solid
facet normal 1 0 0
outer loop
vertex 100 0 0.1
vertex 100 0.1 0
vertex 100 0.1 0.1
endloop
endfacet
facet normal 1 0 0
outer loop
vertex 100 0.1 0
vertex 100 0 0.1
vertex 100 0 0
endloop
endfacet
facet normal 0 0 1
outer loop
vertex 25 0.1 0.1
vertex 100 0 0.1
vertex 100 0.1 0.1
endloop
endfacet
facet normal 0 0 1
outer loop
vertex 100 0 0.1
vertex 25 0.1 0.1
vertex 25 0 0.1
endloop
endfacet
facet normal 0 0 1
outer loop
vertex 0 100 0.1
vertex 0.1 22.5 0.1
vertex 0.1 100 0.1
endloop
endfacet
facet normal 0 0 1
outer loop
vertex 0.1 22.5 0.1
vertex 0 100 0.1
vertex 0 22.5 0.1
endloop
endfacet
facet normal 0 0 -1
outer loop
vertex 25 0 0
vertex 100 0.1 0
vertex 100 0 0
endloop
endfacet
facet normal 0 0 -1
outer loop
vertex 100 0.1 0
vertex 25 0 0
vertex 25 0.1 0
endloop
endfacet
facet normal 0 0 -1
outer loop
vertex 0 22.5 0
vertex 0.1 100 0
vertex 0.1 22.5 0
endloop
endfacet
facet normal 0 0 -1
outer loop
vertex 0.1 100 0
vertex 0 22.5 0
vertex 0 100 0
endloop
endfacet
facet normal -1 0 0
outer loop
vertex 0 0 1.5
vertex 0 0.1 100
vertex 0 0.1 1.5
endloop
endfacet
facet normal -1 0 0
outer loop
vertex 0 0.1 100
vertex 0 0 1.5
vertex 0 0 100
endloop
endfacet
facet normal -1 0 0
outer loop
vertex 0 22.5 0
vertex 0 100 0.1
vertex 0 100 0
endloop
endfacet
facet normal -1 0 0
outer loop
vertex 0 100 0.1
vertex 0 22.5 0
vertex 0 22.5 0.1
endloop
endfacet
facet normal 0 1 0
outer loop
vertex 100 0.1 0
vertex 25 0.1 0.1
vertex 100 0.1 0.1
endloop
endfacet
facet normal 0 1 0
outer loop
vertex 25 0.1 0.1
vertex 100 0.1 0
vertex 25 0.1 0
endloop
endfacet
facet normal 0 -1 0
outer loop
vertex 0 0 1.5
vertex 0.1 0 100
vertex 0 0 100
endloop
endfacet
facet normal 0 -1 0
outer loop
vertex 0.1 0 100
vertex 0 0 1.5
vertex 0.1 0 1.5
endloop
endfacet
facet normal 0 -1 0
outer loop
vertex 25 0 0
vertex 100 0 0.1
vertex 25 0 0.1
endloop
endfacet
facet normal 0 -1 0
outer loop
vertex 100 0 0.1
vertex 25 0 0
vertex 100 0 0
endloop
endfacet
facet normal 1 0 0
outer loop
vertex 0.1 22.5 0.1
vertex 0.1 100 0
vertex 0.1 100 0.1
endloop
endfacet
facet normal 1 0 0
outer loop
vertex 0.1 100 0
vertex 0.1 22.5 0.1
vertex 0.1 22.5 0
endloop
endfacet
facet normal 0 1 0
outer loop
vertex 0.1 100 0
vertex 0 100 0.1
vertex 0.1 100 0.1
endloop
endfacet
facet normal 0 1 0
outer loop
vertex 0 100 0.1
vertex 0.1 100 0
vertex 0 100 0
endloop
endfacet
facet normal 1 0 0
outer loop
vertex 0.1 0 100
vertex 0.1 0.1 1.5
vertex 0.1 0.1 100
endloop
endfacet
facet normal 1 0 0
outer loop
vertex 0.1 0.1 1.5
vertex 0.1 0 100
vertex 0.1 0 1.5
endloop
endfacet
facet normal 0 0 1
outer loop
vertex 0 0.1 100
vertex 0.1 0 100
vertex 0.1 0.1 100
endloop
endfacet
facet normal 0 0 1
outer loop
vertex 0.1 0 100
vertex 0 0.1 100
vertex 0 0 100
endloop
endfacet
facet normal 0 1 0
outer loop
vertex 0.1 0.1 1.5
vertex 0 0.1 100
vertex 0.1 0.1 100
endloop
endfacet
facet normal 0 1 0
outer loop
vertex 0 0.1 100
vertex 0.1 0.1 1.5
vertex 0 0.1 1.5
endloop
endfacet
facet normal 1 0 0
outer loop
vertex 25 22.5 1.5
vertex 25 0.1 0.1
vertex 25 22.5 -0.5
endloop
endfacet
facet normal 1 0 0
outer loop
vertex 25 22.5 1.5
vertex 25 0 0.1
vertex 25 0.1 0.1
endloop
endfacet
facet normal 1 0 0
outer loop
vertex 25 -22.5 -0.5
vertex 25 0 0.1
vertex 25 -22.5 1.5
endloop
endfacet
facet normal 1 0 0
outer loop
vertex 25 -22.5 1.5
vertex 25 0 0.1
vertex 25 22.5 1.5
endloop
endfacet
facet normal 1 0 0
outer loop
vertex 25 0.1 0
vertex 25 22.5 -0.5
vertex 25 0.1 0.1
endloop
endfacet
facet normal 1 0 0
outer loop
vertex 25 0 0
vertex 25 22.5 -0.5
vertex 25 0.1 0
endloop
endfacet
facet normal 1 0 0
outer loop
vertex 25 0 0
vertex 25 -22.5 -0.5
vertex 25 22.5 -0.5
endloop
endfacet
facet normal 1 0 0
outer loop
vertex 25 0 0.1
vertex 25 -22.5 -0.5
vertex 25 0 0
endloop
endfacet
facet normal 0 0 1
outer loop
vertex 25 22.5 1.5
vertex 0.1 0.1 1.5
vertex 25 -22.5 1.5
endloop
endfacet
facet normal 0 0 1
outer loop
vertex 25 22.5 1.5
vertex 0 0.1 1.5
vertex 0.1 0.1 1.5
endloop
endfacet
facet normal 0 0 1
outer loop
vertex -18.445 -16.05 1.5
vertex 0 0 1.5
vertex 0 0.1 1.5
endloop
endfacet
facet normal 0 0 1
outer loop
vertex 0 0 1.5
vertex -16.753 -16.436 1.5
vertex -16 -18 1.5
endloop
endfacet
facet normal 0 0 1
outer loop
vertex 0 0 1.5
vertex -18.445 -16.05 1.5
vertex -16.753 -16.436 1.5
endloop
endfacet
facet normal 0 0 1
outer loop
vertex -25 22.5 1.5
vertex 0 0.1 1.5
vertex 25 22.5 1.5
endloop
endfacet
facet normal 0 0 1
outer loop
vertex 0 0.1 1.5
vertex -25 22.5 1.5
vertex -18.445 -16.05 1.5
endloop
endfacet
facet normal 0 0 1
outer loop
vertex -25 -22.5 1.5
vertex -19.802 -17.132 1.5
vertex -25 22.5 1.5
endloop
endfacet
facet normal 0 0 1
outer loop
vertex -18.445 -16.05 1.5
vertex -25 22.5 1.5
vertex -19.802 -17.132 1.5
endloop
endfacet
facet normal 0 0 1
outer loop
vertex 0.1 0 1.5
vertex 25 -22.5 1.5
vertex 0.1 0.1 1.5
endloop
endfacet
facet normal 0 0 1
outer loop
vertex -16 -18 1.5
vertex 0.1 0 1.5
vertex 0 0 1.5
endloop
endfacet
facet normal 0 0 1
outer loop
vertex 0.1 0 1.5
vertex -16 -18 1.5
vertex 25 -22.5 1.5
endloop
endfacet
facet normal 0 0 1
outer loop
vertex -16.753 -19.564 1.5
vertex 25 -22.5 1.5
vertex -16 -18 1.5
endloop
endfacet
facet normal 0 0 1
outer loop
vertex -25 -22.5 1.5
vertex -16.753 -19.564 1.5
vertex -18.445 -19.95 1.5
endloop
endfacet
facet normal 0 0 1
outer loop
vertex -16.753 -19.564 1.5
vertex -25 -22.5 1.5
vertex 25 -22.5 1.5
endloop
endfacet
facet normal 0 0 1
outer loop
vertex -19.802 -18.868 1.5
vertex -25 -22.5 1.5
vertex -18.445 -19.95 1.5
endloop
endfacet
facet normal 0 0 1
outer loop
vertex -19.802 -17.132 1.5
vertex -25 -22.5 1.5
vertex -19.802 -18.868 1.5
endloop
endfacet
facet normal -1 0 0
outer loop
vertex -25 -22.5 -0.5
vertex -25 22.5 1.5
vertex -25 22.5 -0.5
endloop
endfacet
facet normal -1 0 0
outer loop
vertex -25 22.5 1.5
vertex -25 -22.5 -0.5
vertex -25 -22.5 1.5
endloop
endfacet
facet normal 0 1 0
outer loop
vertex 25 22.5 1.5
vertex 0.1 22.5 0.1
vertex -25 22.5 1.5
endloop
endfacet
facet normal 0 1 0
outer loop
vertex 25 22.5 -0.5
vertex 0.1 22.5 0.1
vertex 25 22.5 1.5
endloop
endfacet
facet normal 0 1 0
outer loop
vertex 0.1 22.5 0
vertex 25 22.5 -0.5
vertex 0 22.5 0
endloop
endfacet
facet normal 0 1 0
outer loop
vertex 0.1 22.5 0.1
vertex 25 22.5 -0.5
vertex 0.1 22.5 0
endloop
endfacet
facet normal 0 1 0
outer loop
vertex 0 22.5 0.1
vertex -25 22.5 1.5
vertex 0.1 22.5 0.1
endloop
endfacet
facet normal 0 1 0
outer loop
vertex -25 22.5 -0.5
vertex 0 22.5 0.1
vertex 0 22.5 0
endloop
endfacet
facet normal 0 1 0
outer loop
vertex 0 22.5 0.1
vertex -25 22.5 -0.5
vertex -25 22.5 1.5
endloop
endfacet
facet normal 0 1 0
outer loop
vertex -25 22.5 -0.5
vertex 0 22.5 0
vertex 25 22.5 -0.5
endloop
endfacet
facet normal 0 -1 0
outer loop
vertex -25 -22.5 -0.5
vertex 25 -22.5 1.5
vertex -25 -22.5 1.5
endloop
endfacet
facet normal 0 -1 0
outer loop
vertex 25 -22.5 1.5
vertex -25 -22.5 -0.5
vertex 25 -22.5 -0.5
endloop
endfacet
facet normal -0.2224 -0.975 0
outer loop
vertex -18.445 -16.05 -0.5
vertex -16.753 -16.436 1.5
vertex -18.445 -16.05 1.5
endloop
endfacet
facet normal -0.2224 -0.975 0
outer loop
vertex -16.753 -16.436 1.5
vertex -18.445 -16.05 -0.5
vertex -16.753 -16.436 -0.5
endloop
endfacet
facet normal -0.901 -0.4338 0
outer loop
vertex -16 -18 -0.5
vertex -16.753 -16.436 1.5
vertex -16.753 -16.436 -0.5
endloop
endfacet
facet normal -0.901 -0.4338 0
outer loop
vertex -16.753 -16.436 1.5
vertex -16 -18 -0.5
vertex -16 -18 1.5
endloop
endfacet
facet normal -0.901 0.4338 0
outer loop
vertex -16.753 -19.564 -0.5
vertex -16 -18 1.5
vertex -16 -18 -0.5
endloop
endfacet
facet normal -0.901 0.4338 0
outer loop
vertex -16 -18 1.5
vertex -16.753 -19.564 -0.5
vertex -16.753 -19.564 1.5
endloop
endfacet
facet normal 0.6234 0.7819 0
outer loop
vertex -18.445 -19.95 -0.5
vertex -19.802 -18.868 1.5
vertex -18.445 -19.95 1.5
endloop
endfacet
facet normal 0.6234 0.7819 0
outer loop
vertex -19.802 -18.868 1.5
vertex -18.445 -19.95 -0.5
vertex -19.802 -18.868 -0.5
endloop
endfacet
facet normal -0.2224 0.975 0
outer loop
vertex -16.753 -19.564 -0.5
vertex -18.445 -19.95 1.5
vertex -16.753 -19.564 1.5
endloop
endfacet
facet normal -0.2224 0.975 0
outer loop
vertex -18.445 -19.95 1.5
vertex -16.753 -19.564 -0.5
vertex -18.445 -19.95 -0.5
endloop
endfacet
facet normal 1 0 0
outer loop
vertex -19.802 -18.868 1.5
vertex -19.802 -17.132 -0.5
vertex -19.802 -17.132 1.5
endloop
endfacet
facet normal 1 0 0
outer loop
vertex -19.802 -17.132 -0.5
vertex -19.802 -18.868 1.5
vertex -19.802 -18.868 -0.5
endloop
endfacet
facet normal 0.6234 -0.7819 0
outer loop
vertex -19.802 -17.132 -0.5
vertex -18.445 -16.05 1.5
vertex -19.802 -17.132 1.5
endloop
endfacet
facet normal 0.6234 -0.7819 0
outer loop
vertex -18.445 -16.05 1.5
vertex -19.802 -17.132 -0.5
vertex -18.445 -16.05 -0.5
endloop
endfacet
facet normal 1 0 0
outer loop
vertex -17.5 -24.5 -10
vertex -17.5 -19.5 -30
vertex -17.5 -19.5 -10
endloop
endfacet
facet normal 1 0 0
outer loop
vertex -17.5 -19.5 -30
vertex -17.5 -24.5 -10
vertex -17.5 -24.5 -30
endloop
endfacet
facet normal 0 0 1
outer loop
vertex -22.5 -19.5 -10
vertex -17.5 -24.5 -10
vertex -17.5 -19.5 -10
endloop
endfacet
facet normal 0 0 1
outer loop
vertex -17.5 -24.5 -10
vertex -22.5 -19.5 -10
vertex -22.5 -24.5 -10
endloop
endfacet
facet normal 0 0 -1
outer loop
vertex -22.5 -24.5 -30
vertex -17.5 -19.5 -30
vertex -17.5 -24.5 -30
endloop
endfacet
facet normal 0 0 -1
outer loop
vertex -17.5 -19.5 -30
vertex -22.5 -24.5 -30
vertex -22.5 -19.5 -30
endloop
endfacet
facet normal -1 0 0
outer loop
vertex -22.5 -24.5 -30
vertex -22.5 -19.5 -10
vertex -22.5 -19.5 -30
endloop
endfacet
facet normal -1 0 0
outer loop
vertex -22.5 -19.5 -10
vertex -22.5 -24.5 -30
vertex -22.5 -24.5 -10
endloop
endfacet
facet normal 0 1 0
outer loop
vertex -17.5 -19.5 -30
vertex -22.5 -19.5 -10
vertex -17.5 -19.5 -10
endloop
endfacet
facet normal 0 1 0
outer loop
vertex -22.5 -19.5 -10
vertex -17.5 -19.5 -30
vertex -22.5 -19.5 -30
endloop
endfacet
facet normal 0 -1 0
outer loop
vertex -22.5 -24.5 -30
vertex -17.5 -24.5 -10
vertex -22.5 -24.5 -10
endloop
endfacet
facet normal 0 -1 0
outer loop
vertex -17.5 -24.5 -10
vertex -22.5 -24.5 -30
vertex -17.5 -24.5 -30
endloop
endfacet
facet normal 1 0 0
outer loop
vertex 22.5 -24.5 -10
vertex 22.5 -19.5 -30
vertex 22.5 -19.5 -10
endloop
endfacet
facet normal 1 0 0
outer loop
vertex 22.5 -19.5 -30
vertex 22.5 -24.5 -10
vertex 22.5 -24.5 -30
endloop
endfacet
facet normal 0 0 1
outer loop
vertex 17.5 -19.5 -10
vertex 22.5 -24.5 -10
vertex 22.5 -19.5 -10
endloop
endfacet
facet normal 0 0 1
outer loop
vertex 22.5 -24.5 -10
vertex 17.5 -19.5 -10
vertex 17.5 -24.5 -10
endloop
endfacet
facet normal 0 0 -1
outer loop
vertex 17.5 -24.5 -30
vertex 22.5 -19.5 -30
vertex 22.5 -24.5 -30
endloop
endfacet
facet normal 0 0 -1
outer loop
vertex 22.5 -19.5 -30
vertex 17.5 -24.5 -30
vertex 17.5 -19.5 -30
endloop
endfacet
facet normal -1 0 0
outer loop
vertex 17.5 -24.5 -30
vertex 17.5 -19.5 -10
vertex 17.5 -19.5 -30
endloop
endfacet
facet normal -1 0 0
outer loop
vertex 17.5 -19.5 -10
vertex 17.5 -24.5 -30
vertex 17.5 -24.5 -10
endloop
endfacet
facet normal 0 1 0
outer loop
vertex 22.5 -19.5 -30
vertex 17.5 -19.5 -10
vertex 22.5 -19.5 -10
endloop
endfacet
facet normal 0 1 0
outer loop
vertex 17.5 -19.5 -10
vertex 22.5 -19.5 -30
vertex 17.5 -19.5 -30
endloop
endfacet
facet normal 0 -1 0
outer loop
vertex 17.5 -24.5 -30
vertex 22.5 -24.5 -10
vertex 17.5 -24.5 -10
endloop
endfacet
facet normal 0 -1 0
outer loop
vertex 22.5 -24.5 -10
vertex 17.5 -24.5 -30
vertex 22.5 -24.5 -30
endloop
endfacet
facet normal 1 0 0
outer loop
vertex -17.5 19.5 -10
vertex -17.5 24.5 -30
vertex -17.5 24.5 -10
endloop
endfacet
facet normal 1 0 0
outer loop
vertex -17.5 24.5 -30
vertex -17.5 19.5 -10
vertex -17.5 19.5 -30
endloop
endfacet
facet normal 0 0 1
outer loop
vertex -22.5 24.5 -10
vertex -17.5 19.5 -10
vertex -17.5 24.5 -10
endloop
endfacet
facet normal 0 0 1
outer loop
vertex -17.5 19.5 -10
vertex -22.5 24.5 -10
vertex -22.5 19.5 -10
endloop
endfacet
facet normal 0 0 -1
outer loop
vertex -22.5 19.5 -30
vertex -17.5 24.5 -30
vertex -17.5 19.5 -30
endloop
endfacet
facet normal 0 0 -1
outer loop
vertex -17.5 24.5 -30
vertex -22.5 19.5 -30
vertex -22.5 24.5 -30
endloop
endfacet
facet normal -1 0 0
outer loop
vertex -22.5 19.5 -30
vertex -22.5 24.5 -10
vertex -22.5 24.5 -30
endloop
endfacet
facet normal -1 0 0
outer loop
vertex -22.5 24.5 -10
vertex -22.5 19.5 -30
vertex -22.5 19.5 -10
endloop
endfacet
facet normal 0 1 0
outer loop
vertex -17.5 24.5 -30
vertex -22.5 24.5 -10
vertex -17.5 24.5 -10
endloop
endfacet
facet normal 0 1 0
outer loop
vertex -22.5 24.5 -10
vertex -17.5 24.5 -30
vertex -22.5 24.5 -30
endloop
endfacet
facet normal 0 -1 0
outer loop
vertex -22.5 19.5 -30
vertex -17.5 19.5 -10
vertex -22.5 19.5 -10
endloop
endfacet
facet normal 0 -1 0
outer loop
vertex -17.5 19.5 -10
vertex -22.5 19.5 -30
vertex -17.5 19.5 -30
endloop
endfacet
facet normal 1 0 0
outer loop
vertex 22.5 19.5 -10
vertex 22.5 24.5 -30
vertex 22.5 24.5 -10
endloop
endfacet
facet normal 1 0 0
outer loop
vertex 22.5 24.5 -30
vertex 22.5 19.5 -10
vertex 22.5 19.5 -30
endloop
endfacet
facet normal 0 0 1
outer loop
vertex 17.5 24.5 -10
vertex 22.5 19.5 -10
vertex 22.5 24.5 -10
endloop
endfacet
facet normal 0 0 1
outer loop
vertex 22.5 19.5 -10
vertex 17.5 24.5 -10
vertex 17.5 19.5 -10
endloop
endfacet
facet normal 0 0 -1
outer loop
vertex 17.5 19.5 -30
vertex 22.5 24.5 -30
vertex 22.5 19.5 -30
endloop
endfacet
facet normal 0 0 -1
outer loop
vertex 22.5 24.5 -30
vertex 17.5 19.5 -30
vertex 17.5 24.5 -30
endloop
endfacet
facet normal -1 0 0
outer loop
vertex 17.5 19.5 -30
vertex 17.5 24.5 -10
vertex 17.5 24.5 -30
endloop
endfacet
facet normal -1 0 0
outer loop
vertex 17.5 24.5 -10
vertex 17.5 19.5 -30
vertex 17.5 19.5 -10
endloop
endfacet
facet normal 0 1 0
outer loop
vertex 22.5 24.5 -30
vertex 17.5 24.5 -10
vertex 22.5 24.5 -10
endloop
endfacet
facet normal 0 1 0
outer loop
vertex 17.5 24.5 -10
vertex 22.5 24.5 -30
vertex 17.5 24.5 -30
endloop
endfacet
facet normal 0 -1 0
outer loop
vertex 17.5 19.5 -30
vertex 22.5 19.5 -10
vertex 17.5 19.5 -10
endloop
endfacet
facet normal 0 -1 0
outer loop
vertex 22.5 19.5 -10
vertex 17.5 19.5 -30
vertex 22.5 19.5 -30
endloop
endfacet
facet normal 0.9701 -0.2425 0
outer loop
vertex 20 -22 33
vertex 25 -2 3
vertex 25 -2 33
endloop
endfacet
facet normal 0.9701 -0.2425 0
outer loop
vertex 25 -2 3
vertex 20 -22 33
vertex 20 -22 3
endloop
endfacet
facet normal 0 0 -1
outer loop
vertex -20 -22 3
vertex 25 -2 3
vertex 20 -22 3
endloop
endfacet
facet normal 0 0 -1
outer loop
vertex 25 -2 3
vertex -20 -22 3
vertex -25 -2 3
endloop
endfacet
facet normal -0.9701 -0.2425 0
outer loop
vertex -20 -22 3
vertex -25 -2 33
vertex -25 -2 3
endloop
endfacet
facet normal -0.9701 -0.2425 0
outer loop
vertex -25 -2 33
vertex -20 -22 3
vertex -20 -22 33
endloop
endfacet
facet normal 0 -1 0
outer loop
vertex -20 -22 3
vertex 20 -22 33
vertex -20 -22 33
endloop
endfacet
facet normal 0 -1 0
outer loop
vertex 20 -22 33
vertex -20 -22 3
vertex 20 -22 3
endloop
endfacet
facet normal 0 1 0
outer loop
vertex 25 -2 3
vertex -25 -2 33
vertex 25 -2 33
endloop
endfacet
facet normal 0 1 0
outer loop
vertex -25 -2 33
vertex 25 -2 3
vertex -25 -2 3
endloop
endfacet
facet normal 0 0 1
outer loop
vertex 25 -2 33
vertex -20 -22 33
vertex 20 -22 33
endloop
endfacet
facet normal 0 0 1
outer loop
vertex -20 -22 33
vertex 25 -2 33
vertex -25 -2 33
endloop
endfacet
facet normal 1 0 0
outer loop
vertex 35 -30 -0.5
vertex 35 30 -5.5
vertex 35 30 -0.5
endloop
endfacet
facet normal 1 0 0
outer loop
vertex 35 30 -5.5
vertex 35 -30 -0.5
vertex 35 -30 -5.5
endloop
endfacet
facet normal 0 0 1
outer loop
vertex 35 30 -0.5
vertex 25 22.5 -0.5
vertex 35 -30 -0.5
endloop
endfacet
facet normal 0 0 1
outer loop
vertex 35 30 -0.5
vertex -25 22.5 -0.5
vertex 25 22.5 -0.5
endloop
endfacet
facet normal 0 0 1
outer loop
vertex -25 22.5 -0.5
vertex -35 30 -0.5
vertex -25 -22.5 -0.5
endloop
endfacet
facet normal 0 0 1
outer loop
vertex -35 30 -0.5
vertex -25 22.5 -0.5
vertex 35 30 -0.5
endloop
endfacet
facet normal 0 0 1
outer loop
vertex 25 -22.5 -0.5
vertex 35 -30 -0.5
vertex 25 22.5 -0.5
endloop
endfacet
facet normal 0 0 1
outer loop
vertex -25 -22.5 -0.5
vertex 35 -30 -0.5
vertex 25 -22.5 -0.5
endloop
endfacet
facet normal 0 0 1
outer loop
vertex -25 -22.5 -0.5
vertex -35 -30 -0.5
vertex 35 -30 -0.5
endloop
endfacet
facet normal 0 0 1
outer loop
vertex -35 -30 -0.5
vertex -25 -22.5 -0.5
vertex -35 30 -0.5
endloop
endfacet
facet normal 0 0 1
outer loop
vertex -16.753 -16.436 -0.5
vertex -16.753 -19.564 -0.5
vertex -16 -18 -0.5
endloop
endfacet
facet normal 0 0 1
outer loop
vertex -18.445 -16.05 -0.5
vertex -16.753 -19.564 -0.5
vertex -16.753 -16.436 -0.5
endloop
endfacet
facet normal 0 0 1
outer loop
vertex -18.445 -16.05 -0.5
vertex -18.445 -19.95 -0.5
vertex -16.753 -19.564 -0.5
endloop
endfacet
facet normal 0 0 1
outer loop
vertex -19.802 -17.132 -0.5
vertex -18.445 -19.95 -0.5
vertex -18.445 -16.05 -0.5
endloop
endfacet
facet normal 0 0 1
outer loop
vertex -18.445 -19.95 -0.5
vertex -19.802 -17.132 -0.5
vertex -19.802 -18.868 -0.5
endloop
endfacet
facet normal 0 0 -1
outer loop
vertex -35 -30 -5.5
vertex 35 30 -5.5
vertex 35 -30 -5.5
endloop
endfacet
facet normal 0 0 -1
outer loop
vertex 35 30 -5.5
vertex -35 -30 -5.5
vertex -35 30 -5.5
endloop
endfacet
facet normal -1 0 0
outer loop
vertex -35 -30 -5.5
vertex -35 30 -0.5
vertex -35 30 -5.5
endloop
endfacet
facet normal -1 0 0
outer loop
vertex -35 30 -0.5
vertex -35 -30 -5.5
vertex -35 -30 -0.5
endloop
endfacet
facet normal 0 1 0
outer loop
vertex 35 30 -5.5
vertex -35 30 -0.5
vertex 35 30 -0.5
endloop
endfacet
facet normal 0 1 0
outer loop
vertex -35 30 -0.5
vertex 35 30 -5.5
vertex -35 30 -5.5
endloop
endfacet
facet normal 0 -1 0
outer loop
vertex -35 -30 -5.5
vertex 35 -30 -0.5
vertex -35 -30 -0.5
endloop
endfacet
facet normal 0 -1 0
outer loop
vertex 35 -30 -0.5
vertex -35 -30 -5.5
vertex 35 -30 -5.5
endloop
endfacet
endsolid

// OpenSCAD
    // Combined Scene

    // Permanent Model
    
    // Permanent Model (Black)
    color([0, 0, 0]) {
        // Your permanent model code here
        cube([100,0.1,0.1], center = false);
        cube([0.1,100,0.1], center = false);
        cube([0.1,0.1,100], center = false);
    }
    

    // Dynamic Model
    translate([0, 0, 0]) {
    // Chair seat
    bottom_seat = 3; 
    seat_width = 50; 
    seat_depth = 45; 
    difference() {
        cube([seat_width, seat_depth, bottom_seat], center=true); // Seat
        translate([-18, -18, -0.1]) 
            cylinder(h=5, r=2, center=true); // Cutout for lighter seat
    }

    // Ergonomic backrest with an incline for comfort
    backrest_angle = 20; 
    backrest_height = 30; 
    translate([0, -22, bottom_seat]) {
        linear_extrude(height=backrest_height) {
            polygon(points=[[0, 0], [20, 0], [25, backrest_angle], [-25, backrest_angle], [-20, 0]], paths=[[0, 1, 2, 3, 4]]);
        }
    }

    // Simplified legs with stability features
    leg_height = 20; 
    leg_thickness = 5; 
    for (x = [-1, 1]) {
        translate([20 * x, -22, -leg_height]) {
            cube([leg_thickness, leg_thickness, leg_height], center=true); // Front legs
        }
    }
    for (x = [-1, 1]) {
        translate([20 * x, 22, -leg_height]) {
            cube([leg_thickness, leg_thickness, leg_height], center=true); // Back legs
        }
    }

    // Armrests with a modern curve
    armrest_thickness = 10; 
    for (x = [-1, 1]) {
        translate([24 * x, -25, 10]) {
            difference() {
                scale([1, 0.5, 1])
                    rotate_extrude(angle=180)
                        translate([0, 10, 0])
                        circle(r=3);
                translate([-6, -0.5, 0])
                    cube([12, 1, armrest_thickness], center=true); // Armrest thickness
            }
        }
    }

    // Wider base for overall stability
    base_width = 70; 
    base_depth = 60; 
    translate([0, 0, -3]) {
        cube([base_width, base_depth, 5], center=true); // Larger base for stability
    }
}
    
